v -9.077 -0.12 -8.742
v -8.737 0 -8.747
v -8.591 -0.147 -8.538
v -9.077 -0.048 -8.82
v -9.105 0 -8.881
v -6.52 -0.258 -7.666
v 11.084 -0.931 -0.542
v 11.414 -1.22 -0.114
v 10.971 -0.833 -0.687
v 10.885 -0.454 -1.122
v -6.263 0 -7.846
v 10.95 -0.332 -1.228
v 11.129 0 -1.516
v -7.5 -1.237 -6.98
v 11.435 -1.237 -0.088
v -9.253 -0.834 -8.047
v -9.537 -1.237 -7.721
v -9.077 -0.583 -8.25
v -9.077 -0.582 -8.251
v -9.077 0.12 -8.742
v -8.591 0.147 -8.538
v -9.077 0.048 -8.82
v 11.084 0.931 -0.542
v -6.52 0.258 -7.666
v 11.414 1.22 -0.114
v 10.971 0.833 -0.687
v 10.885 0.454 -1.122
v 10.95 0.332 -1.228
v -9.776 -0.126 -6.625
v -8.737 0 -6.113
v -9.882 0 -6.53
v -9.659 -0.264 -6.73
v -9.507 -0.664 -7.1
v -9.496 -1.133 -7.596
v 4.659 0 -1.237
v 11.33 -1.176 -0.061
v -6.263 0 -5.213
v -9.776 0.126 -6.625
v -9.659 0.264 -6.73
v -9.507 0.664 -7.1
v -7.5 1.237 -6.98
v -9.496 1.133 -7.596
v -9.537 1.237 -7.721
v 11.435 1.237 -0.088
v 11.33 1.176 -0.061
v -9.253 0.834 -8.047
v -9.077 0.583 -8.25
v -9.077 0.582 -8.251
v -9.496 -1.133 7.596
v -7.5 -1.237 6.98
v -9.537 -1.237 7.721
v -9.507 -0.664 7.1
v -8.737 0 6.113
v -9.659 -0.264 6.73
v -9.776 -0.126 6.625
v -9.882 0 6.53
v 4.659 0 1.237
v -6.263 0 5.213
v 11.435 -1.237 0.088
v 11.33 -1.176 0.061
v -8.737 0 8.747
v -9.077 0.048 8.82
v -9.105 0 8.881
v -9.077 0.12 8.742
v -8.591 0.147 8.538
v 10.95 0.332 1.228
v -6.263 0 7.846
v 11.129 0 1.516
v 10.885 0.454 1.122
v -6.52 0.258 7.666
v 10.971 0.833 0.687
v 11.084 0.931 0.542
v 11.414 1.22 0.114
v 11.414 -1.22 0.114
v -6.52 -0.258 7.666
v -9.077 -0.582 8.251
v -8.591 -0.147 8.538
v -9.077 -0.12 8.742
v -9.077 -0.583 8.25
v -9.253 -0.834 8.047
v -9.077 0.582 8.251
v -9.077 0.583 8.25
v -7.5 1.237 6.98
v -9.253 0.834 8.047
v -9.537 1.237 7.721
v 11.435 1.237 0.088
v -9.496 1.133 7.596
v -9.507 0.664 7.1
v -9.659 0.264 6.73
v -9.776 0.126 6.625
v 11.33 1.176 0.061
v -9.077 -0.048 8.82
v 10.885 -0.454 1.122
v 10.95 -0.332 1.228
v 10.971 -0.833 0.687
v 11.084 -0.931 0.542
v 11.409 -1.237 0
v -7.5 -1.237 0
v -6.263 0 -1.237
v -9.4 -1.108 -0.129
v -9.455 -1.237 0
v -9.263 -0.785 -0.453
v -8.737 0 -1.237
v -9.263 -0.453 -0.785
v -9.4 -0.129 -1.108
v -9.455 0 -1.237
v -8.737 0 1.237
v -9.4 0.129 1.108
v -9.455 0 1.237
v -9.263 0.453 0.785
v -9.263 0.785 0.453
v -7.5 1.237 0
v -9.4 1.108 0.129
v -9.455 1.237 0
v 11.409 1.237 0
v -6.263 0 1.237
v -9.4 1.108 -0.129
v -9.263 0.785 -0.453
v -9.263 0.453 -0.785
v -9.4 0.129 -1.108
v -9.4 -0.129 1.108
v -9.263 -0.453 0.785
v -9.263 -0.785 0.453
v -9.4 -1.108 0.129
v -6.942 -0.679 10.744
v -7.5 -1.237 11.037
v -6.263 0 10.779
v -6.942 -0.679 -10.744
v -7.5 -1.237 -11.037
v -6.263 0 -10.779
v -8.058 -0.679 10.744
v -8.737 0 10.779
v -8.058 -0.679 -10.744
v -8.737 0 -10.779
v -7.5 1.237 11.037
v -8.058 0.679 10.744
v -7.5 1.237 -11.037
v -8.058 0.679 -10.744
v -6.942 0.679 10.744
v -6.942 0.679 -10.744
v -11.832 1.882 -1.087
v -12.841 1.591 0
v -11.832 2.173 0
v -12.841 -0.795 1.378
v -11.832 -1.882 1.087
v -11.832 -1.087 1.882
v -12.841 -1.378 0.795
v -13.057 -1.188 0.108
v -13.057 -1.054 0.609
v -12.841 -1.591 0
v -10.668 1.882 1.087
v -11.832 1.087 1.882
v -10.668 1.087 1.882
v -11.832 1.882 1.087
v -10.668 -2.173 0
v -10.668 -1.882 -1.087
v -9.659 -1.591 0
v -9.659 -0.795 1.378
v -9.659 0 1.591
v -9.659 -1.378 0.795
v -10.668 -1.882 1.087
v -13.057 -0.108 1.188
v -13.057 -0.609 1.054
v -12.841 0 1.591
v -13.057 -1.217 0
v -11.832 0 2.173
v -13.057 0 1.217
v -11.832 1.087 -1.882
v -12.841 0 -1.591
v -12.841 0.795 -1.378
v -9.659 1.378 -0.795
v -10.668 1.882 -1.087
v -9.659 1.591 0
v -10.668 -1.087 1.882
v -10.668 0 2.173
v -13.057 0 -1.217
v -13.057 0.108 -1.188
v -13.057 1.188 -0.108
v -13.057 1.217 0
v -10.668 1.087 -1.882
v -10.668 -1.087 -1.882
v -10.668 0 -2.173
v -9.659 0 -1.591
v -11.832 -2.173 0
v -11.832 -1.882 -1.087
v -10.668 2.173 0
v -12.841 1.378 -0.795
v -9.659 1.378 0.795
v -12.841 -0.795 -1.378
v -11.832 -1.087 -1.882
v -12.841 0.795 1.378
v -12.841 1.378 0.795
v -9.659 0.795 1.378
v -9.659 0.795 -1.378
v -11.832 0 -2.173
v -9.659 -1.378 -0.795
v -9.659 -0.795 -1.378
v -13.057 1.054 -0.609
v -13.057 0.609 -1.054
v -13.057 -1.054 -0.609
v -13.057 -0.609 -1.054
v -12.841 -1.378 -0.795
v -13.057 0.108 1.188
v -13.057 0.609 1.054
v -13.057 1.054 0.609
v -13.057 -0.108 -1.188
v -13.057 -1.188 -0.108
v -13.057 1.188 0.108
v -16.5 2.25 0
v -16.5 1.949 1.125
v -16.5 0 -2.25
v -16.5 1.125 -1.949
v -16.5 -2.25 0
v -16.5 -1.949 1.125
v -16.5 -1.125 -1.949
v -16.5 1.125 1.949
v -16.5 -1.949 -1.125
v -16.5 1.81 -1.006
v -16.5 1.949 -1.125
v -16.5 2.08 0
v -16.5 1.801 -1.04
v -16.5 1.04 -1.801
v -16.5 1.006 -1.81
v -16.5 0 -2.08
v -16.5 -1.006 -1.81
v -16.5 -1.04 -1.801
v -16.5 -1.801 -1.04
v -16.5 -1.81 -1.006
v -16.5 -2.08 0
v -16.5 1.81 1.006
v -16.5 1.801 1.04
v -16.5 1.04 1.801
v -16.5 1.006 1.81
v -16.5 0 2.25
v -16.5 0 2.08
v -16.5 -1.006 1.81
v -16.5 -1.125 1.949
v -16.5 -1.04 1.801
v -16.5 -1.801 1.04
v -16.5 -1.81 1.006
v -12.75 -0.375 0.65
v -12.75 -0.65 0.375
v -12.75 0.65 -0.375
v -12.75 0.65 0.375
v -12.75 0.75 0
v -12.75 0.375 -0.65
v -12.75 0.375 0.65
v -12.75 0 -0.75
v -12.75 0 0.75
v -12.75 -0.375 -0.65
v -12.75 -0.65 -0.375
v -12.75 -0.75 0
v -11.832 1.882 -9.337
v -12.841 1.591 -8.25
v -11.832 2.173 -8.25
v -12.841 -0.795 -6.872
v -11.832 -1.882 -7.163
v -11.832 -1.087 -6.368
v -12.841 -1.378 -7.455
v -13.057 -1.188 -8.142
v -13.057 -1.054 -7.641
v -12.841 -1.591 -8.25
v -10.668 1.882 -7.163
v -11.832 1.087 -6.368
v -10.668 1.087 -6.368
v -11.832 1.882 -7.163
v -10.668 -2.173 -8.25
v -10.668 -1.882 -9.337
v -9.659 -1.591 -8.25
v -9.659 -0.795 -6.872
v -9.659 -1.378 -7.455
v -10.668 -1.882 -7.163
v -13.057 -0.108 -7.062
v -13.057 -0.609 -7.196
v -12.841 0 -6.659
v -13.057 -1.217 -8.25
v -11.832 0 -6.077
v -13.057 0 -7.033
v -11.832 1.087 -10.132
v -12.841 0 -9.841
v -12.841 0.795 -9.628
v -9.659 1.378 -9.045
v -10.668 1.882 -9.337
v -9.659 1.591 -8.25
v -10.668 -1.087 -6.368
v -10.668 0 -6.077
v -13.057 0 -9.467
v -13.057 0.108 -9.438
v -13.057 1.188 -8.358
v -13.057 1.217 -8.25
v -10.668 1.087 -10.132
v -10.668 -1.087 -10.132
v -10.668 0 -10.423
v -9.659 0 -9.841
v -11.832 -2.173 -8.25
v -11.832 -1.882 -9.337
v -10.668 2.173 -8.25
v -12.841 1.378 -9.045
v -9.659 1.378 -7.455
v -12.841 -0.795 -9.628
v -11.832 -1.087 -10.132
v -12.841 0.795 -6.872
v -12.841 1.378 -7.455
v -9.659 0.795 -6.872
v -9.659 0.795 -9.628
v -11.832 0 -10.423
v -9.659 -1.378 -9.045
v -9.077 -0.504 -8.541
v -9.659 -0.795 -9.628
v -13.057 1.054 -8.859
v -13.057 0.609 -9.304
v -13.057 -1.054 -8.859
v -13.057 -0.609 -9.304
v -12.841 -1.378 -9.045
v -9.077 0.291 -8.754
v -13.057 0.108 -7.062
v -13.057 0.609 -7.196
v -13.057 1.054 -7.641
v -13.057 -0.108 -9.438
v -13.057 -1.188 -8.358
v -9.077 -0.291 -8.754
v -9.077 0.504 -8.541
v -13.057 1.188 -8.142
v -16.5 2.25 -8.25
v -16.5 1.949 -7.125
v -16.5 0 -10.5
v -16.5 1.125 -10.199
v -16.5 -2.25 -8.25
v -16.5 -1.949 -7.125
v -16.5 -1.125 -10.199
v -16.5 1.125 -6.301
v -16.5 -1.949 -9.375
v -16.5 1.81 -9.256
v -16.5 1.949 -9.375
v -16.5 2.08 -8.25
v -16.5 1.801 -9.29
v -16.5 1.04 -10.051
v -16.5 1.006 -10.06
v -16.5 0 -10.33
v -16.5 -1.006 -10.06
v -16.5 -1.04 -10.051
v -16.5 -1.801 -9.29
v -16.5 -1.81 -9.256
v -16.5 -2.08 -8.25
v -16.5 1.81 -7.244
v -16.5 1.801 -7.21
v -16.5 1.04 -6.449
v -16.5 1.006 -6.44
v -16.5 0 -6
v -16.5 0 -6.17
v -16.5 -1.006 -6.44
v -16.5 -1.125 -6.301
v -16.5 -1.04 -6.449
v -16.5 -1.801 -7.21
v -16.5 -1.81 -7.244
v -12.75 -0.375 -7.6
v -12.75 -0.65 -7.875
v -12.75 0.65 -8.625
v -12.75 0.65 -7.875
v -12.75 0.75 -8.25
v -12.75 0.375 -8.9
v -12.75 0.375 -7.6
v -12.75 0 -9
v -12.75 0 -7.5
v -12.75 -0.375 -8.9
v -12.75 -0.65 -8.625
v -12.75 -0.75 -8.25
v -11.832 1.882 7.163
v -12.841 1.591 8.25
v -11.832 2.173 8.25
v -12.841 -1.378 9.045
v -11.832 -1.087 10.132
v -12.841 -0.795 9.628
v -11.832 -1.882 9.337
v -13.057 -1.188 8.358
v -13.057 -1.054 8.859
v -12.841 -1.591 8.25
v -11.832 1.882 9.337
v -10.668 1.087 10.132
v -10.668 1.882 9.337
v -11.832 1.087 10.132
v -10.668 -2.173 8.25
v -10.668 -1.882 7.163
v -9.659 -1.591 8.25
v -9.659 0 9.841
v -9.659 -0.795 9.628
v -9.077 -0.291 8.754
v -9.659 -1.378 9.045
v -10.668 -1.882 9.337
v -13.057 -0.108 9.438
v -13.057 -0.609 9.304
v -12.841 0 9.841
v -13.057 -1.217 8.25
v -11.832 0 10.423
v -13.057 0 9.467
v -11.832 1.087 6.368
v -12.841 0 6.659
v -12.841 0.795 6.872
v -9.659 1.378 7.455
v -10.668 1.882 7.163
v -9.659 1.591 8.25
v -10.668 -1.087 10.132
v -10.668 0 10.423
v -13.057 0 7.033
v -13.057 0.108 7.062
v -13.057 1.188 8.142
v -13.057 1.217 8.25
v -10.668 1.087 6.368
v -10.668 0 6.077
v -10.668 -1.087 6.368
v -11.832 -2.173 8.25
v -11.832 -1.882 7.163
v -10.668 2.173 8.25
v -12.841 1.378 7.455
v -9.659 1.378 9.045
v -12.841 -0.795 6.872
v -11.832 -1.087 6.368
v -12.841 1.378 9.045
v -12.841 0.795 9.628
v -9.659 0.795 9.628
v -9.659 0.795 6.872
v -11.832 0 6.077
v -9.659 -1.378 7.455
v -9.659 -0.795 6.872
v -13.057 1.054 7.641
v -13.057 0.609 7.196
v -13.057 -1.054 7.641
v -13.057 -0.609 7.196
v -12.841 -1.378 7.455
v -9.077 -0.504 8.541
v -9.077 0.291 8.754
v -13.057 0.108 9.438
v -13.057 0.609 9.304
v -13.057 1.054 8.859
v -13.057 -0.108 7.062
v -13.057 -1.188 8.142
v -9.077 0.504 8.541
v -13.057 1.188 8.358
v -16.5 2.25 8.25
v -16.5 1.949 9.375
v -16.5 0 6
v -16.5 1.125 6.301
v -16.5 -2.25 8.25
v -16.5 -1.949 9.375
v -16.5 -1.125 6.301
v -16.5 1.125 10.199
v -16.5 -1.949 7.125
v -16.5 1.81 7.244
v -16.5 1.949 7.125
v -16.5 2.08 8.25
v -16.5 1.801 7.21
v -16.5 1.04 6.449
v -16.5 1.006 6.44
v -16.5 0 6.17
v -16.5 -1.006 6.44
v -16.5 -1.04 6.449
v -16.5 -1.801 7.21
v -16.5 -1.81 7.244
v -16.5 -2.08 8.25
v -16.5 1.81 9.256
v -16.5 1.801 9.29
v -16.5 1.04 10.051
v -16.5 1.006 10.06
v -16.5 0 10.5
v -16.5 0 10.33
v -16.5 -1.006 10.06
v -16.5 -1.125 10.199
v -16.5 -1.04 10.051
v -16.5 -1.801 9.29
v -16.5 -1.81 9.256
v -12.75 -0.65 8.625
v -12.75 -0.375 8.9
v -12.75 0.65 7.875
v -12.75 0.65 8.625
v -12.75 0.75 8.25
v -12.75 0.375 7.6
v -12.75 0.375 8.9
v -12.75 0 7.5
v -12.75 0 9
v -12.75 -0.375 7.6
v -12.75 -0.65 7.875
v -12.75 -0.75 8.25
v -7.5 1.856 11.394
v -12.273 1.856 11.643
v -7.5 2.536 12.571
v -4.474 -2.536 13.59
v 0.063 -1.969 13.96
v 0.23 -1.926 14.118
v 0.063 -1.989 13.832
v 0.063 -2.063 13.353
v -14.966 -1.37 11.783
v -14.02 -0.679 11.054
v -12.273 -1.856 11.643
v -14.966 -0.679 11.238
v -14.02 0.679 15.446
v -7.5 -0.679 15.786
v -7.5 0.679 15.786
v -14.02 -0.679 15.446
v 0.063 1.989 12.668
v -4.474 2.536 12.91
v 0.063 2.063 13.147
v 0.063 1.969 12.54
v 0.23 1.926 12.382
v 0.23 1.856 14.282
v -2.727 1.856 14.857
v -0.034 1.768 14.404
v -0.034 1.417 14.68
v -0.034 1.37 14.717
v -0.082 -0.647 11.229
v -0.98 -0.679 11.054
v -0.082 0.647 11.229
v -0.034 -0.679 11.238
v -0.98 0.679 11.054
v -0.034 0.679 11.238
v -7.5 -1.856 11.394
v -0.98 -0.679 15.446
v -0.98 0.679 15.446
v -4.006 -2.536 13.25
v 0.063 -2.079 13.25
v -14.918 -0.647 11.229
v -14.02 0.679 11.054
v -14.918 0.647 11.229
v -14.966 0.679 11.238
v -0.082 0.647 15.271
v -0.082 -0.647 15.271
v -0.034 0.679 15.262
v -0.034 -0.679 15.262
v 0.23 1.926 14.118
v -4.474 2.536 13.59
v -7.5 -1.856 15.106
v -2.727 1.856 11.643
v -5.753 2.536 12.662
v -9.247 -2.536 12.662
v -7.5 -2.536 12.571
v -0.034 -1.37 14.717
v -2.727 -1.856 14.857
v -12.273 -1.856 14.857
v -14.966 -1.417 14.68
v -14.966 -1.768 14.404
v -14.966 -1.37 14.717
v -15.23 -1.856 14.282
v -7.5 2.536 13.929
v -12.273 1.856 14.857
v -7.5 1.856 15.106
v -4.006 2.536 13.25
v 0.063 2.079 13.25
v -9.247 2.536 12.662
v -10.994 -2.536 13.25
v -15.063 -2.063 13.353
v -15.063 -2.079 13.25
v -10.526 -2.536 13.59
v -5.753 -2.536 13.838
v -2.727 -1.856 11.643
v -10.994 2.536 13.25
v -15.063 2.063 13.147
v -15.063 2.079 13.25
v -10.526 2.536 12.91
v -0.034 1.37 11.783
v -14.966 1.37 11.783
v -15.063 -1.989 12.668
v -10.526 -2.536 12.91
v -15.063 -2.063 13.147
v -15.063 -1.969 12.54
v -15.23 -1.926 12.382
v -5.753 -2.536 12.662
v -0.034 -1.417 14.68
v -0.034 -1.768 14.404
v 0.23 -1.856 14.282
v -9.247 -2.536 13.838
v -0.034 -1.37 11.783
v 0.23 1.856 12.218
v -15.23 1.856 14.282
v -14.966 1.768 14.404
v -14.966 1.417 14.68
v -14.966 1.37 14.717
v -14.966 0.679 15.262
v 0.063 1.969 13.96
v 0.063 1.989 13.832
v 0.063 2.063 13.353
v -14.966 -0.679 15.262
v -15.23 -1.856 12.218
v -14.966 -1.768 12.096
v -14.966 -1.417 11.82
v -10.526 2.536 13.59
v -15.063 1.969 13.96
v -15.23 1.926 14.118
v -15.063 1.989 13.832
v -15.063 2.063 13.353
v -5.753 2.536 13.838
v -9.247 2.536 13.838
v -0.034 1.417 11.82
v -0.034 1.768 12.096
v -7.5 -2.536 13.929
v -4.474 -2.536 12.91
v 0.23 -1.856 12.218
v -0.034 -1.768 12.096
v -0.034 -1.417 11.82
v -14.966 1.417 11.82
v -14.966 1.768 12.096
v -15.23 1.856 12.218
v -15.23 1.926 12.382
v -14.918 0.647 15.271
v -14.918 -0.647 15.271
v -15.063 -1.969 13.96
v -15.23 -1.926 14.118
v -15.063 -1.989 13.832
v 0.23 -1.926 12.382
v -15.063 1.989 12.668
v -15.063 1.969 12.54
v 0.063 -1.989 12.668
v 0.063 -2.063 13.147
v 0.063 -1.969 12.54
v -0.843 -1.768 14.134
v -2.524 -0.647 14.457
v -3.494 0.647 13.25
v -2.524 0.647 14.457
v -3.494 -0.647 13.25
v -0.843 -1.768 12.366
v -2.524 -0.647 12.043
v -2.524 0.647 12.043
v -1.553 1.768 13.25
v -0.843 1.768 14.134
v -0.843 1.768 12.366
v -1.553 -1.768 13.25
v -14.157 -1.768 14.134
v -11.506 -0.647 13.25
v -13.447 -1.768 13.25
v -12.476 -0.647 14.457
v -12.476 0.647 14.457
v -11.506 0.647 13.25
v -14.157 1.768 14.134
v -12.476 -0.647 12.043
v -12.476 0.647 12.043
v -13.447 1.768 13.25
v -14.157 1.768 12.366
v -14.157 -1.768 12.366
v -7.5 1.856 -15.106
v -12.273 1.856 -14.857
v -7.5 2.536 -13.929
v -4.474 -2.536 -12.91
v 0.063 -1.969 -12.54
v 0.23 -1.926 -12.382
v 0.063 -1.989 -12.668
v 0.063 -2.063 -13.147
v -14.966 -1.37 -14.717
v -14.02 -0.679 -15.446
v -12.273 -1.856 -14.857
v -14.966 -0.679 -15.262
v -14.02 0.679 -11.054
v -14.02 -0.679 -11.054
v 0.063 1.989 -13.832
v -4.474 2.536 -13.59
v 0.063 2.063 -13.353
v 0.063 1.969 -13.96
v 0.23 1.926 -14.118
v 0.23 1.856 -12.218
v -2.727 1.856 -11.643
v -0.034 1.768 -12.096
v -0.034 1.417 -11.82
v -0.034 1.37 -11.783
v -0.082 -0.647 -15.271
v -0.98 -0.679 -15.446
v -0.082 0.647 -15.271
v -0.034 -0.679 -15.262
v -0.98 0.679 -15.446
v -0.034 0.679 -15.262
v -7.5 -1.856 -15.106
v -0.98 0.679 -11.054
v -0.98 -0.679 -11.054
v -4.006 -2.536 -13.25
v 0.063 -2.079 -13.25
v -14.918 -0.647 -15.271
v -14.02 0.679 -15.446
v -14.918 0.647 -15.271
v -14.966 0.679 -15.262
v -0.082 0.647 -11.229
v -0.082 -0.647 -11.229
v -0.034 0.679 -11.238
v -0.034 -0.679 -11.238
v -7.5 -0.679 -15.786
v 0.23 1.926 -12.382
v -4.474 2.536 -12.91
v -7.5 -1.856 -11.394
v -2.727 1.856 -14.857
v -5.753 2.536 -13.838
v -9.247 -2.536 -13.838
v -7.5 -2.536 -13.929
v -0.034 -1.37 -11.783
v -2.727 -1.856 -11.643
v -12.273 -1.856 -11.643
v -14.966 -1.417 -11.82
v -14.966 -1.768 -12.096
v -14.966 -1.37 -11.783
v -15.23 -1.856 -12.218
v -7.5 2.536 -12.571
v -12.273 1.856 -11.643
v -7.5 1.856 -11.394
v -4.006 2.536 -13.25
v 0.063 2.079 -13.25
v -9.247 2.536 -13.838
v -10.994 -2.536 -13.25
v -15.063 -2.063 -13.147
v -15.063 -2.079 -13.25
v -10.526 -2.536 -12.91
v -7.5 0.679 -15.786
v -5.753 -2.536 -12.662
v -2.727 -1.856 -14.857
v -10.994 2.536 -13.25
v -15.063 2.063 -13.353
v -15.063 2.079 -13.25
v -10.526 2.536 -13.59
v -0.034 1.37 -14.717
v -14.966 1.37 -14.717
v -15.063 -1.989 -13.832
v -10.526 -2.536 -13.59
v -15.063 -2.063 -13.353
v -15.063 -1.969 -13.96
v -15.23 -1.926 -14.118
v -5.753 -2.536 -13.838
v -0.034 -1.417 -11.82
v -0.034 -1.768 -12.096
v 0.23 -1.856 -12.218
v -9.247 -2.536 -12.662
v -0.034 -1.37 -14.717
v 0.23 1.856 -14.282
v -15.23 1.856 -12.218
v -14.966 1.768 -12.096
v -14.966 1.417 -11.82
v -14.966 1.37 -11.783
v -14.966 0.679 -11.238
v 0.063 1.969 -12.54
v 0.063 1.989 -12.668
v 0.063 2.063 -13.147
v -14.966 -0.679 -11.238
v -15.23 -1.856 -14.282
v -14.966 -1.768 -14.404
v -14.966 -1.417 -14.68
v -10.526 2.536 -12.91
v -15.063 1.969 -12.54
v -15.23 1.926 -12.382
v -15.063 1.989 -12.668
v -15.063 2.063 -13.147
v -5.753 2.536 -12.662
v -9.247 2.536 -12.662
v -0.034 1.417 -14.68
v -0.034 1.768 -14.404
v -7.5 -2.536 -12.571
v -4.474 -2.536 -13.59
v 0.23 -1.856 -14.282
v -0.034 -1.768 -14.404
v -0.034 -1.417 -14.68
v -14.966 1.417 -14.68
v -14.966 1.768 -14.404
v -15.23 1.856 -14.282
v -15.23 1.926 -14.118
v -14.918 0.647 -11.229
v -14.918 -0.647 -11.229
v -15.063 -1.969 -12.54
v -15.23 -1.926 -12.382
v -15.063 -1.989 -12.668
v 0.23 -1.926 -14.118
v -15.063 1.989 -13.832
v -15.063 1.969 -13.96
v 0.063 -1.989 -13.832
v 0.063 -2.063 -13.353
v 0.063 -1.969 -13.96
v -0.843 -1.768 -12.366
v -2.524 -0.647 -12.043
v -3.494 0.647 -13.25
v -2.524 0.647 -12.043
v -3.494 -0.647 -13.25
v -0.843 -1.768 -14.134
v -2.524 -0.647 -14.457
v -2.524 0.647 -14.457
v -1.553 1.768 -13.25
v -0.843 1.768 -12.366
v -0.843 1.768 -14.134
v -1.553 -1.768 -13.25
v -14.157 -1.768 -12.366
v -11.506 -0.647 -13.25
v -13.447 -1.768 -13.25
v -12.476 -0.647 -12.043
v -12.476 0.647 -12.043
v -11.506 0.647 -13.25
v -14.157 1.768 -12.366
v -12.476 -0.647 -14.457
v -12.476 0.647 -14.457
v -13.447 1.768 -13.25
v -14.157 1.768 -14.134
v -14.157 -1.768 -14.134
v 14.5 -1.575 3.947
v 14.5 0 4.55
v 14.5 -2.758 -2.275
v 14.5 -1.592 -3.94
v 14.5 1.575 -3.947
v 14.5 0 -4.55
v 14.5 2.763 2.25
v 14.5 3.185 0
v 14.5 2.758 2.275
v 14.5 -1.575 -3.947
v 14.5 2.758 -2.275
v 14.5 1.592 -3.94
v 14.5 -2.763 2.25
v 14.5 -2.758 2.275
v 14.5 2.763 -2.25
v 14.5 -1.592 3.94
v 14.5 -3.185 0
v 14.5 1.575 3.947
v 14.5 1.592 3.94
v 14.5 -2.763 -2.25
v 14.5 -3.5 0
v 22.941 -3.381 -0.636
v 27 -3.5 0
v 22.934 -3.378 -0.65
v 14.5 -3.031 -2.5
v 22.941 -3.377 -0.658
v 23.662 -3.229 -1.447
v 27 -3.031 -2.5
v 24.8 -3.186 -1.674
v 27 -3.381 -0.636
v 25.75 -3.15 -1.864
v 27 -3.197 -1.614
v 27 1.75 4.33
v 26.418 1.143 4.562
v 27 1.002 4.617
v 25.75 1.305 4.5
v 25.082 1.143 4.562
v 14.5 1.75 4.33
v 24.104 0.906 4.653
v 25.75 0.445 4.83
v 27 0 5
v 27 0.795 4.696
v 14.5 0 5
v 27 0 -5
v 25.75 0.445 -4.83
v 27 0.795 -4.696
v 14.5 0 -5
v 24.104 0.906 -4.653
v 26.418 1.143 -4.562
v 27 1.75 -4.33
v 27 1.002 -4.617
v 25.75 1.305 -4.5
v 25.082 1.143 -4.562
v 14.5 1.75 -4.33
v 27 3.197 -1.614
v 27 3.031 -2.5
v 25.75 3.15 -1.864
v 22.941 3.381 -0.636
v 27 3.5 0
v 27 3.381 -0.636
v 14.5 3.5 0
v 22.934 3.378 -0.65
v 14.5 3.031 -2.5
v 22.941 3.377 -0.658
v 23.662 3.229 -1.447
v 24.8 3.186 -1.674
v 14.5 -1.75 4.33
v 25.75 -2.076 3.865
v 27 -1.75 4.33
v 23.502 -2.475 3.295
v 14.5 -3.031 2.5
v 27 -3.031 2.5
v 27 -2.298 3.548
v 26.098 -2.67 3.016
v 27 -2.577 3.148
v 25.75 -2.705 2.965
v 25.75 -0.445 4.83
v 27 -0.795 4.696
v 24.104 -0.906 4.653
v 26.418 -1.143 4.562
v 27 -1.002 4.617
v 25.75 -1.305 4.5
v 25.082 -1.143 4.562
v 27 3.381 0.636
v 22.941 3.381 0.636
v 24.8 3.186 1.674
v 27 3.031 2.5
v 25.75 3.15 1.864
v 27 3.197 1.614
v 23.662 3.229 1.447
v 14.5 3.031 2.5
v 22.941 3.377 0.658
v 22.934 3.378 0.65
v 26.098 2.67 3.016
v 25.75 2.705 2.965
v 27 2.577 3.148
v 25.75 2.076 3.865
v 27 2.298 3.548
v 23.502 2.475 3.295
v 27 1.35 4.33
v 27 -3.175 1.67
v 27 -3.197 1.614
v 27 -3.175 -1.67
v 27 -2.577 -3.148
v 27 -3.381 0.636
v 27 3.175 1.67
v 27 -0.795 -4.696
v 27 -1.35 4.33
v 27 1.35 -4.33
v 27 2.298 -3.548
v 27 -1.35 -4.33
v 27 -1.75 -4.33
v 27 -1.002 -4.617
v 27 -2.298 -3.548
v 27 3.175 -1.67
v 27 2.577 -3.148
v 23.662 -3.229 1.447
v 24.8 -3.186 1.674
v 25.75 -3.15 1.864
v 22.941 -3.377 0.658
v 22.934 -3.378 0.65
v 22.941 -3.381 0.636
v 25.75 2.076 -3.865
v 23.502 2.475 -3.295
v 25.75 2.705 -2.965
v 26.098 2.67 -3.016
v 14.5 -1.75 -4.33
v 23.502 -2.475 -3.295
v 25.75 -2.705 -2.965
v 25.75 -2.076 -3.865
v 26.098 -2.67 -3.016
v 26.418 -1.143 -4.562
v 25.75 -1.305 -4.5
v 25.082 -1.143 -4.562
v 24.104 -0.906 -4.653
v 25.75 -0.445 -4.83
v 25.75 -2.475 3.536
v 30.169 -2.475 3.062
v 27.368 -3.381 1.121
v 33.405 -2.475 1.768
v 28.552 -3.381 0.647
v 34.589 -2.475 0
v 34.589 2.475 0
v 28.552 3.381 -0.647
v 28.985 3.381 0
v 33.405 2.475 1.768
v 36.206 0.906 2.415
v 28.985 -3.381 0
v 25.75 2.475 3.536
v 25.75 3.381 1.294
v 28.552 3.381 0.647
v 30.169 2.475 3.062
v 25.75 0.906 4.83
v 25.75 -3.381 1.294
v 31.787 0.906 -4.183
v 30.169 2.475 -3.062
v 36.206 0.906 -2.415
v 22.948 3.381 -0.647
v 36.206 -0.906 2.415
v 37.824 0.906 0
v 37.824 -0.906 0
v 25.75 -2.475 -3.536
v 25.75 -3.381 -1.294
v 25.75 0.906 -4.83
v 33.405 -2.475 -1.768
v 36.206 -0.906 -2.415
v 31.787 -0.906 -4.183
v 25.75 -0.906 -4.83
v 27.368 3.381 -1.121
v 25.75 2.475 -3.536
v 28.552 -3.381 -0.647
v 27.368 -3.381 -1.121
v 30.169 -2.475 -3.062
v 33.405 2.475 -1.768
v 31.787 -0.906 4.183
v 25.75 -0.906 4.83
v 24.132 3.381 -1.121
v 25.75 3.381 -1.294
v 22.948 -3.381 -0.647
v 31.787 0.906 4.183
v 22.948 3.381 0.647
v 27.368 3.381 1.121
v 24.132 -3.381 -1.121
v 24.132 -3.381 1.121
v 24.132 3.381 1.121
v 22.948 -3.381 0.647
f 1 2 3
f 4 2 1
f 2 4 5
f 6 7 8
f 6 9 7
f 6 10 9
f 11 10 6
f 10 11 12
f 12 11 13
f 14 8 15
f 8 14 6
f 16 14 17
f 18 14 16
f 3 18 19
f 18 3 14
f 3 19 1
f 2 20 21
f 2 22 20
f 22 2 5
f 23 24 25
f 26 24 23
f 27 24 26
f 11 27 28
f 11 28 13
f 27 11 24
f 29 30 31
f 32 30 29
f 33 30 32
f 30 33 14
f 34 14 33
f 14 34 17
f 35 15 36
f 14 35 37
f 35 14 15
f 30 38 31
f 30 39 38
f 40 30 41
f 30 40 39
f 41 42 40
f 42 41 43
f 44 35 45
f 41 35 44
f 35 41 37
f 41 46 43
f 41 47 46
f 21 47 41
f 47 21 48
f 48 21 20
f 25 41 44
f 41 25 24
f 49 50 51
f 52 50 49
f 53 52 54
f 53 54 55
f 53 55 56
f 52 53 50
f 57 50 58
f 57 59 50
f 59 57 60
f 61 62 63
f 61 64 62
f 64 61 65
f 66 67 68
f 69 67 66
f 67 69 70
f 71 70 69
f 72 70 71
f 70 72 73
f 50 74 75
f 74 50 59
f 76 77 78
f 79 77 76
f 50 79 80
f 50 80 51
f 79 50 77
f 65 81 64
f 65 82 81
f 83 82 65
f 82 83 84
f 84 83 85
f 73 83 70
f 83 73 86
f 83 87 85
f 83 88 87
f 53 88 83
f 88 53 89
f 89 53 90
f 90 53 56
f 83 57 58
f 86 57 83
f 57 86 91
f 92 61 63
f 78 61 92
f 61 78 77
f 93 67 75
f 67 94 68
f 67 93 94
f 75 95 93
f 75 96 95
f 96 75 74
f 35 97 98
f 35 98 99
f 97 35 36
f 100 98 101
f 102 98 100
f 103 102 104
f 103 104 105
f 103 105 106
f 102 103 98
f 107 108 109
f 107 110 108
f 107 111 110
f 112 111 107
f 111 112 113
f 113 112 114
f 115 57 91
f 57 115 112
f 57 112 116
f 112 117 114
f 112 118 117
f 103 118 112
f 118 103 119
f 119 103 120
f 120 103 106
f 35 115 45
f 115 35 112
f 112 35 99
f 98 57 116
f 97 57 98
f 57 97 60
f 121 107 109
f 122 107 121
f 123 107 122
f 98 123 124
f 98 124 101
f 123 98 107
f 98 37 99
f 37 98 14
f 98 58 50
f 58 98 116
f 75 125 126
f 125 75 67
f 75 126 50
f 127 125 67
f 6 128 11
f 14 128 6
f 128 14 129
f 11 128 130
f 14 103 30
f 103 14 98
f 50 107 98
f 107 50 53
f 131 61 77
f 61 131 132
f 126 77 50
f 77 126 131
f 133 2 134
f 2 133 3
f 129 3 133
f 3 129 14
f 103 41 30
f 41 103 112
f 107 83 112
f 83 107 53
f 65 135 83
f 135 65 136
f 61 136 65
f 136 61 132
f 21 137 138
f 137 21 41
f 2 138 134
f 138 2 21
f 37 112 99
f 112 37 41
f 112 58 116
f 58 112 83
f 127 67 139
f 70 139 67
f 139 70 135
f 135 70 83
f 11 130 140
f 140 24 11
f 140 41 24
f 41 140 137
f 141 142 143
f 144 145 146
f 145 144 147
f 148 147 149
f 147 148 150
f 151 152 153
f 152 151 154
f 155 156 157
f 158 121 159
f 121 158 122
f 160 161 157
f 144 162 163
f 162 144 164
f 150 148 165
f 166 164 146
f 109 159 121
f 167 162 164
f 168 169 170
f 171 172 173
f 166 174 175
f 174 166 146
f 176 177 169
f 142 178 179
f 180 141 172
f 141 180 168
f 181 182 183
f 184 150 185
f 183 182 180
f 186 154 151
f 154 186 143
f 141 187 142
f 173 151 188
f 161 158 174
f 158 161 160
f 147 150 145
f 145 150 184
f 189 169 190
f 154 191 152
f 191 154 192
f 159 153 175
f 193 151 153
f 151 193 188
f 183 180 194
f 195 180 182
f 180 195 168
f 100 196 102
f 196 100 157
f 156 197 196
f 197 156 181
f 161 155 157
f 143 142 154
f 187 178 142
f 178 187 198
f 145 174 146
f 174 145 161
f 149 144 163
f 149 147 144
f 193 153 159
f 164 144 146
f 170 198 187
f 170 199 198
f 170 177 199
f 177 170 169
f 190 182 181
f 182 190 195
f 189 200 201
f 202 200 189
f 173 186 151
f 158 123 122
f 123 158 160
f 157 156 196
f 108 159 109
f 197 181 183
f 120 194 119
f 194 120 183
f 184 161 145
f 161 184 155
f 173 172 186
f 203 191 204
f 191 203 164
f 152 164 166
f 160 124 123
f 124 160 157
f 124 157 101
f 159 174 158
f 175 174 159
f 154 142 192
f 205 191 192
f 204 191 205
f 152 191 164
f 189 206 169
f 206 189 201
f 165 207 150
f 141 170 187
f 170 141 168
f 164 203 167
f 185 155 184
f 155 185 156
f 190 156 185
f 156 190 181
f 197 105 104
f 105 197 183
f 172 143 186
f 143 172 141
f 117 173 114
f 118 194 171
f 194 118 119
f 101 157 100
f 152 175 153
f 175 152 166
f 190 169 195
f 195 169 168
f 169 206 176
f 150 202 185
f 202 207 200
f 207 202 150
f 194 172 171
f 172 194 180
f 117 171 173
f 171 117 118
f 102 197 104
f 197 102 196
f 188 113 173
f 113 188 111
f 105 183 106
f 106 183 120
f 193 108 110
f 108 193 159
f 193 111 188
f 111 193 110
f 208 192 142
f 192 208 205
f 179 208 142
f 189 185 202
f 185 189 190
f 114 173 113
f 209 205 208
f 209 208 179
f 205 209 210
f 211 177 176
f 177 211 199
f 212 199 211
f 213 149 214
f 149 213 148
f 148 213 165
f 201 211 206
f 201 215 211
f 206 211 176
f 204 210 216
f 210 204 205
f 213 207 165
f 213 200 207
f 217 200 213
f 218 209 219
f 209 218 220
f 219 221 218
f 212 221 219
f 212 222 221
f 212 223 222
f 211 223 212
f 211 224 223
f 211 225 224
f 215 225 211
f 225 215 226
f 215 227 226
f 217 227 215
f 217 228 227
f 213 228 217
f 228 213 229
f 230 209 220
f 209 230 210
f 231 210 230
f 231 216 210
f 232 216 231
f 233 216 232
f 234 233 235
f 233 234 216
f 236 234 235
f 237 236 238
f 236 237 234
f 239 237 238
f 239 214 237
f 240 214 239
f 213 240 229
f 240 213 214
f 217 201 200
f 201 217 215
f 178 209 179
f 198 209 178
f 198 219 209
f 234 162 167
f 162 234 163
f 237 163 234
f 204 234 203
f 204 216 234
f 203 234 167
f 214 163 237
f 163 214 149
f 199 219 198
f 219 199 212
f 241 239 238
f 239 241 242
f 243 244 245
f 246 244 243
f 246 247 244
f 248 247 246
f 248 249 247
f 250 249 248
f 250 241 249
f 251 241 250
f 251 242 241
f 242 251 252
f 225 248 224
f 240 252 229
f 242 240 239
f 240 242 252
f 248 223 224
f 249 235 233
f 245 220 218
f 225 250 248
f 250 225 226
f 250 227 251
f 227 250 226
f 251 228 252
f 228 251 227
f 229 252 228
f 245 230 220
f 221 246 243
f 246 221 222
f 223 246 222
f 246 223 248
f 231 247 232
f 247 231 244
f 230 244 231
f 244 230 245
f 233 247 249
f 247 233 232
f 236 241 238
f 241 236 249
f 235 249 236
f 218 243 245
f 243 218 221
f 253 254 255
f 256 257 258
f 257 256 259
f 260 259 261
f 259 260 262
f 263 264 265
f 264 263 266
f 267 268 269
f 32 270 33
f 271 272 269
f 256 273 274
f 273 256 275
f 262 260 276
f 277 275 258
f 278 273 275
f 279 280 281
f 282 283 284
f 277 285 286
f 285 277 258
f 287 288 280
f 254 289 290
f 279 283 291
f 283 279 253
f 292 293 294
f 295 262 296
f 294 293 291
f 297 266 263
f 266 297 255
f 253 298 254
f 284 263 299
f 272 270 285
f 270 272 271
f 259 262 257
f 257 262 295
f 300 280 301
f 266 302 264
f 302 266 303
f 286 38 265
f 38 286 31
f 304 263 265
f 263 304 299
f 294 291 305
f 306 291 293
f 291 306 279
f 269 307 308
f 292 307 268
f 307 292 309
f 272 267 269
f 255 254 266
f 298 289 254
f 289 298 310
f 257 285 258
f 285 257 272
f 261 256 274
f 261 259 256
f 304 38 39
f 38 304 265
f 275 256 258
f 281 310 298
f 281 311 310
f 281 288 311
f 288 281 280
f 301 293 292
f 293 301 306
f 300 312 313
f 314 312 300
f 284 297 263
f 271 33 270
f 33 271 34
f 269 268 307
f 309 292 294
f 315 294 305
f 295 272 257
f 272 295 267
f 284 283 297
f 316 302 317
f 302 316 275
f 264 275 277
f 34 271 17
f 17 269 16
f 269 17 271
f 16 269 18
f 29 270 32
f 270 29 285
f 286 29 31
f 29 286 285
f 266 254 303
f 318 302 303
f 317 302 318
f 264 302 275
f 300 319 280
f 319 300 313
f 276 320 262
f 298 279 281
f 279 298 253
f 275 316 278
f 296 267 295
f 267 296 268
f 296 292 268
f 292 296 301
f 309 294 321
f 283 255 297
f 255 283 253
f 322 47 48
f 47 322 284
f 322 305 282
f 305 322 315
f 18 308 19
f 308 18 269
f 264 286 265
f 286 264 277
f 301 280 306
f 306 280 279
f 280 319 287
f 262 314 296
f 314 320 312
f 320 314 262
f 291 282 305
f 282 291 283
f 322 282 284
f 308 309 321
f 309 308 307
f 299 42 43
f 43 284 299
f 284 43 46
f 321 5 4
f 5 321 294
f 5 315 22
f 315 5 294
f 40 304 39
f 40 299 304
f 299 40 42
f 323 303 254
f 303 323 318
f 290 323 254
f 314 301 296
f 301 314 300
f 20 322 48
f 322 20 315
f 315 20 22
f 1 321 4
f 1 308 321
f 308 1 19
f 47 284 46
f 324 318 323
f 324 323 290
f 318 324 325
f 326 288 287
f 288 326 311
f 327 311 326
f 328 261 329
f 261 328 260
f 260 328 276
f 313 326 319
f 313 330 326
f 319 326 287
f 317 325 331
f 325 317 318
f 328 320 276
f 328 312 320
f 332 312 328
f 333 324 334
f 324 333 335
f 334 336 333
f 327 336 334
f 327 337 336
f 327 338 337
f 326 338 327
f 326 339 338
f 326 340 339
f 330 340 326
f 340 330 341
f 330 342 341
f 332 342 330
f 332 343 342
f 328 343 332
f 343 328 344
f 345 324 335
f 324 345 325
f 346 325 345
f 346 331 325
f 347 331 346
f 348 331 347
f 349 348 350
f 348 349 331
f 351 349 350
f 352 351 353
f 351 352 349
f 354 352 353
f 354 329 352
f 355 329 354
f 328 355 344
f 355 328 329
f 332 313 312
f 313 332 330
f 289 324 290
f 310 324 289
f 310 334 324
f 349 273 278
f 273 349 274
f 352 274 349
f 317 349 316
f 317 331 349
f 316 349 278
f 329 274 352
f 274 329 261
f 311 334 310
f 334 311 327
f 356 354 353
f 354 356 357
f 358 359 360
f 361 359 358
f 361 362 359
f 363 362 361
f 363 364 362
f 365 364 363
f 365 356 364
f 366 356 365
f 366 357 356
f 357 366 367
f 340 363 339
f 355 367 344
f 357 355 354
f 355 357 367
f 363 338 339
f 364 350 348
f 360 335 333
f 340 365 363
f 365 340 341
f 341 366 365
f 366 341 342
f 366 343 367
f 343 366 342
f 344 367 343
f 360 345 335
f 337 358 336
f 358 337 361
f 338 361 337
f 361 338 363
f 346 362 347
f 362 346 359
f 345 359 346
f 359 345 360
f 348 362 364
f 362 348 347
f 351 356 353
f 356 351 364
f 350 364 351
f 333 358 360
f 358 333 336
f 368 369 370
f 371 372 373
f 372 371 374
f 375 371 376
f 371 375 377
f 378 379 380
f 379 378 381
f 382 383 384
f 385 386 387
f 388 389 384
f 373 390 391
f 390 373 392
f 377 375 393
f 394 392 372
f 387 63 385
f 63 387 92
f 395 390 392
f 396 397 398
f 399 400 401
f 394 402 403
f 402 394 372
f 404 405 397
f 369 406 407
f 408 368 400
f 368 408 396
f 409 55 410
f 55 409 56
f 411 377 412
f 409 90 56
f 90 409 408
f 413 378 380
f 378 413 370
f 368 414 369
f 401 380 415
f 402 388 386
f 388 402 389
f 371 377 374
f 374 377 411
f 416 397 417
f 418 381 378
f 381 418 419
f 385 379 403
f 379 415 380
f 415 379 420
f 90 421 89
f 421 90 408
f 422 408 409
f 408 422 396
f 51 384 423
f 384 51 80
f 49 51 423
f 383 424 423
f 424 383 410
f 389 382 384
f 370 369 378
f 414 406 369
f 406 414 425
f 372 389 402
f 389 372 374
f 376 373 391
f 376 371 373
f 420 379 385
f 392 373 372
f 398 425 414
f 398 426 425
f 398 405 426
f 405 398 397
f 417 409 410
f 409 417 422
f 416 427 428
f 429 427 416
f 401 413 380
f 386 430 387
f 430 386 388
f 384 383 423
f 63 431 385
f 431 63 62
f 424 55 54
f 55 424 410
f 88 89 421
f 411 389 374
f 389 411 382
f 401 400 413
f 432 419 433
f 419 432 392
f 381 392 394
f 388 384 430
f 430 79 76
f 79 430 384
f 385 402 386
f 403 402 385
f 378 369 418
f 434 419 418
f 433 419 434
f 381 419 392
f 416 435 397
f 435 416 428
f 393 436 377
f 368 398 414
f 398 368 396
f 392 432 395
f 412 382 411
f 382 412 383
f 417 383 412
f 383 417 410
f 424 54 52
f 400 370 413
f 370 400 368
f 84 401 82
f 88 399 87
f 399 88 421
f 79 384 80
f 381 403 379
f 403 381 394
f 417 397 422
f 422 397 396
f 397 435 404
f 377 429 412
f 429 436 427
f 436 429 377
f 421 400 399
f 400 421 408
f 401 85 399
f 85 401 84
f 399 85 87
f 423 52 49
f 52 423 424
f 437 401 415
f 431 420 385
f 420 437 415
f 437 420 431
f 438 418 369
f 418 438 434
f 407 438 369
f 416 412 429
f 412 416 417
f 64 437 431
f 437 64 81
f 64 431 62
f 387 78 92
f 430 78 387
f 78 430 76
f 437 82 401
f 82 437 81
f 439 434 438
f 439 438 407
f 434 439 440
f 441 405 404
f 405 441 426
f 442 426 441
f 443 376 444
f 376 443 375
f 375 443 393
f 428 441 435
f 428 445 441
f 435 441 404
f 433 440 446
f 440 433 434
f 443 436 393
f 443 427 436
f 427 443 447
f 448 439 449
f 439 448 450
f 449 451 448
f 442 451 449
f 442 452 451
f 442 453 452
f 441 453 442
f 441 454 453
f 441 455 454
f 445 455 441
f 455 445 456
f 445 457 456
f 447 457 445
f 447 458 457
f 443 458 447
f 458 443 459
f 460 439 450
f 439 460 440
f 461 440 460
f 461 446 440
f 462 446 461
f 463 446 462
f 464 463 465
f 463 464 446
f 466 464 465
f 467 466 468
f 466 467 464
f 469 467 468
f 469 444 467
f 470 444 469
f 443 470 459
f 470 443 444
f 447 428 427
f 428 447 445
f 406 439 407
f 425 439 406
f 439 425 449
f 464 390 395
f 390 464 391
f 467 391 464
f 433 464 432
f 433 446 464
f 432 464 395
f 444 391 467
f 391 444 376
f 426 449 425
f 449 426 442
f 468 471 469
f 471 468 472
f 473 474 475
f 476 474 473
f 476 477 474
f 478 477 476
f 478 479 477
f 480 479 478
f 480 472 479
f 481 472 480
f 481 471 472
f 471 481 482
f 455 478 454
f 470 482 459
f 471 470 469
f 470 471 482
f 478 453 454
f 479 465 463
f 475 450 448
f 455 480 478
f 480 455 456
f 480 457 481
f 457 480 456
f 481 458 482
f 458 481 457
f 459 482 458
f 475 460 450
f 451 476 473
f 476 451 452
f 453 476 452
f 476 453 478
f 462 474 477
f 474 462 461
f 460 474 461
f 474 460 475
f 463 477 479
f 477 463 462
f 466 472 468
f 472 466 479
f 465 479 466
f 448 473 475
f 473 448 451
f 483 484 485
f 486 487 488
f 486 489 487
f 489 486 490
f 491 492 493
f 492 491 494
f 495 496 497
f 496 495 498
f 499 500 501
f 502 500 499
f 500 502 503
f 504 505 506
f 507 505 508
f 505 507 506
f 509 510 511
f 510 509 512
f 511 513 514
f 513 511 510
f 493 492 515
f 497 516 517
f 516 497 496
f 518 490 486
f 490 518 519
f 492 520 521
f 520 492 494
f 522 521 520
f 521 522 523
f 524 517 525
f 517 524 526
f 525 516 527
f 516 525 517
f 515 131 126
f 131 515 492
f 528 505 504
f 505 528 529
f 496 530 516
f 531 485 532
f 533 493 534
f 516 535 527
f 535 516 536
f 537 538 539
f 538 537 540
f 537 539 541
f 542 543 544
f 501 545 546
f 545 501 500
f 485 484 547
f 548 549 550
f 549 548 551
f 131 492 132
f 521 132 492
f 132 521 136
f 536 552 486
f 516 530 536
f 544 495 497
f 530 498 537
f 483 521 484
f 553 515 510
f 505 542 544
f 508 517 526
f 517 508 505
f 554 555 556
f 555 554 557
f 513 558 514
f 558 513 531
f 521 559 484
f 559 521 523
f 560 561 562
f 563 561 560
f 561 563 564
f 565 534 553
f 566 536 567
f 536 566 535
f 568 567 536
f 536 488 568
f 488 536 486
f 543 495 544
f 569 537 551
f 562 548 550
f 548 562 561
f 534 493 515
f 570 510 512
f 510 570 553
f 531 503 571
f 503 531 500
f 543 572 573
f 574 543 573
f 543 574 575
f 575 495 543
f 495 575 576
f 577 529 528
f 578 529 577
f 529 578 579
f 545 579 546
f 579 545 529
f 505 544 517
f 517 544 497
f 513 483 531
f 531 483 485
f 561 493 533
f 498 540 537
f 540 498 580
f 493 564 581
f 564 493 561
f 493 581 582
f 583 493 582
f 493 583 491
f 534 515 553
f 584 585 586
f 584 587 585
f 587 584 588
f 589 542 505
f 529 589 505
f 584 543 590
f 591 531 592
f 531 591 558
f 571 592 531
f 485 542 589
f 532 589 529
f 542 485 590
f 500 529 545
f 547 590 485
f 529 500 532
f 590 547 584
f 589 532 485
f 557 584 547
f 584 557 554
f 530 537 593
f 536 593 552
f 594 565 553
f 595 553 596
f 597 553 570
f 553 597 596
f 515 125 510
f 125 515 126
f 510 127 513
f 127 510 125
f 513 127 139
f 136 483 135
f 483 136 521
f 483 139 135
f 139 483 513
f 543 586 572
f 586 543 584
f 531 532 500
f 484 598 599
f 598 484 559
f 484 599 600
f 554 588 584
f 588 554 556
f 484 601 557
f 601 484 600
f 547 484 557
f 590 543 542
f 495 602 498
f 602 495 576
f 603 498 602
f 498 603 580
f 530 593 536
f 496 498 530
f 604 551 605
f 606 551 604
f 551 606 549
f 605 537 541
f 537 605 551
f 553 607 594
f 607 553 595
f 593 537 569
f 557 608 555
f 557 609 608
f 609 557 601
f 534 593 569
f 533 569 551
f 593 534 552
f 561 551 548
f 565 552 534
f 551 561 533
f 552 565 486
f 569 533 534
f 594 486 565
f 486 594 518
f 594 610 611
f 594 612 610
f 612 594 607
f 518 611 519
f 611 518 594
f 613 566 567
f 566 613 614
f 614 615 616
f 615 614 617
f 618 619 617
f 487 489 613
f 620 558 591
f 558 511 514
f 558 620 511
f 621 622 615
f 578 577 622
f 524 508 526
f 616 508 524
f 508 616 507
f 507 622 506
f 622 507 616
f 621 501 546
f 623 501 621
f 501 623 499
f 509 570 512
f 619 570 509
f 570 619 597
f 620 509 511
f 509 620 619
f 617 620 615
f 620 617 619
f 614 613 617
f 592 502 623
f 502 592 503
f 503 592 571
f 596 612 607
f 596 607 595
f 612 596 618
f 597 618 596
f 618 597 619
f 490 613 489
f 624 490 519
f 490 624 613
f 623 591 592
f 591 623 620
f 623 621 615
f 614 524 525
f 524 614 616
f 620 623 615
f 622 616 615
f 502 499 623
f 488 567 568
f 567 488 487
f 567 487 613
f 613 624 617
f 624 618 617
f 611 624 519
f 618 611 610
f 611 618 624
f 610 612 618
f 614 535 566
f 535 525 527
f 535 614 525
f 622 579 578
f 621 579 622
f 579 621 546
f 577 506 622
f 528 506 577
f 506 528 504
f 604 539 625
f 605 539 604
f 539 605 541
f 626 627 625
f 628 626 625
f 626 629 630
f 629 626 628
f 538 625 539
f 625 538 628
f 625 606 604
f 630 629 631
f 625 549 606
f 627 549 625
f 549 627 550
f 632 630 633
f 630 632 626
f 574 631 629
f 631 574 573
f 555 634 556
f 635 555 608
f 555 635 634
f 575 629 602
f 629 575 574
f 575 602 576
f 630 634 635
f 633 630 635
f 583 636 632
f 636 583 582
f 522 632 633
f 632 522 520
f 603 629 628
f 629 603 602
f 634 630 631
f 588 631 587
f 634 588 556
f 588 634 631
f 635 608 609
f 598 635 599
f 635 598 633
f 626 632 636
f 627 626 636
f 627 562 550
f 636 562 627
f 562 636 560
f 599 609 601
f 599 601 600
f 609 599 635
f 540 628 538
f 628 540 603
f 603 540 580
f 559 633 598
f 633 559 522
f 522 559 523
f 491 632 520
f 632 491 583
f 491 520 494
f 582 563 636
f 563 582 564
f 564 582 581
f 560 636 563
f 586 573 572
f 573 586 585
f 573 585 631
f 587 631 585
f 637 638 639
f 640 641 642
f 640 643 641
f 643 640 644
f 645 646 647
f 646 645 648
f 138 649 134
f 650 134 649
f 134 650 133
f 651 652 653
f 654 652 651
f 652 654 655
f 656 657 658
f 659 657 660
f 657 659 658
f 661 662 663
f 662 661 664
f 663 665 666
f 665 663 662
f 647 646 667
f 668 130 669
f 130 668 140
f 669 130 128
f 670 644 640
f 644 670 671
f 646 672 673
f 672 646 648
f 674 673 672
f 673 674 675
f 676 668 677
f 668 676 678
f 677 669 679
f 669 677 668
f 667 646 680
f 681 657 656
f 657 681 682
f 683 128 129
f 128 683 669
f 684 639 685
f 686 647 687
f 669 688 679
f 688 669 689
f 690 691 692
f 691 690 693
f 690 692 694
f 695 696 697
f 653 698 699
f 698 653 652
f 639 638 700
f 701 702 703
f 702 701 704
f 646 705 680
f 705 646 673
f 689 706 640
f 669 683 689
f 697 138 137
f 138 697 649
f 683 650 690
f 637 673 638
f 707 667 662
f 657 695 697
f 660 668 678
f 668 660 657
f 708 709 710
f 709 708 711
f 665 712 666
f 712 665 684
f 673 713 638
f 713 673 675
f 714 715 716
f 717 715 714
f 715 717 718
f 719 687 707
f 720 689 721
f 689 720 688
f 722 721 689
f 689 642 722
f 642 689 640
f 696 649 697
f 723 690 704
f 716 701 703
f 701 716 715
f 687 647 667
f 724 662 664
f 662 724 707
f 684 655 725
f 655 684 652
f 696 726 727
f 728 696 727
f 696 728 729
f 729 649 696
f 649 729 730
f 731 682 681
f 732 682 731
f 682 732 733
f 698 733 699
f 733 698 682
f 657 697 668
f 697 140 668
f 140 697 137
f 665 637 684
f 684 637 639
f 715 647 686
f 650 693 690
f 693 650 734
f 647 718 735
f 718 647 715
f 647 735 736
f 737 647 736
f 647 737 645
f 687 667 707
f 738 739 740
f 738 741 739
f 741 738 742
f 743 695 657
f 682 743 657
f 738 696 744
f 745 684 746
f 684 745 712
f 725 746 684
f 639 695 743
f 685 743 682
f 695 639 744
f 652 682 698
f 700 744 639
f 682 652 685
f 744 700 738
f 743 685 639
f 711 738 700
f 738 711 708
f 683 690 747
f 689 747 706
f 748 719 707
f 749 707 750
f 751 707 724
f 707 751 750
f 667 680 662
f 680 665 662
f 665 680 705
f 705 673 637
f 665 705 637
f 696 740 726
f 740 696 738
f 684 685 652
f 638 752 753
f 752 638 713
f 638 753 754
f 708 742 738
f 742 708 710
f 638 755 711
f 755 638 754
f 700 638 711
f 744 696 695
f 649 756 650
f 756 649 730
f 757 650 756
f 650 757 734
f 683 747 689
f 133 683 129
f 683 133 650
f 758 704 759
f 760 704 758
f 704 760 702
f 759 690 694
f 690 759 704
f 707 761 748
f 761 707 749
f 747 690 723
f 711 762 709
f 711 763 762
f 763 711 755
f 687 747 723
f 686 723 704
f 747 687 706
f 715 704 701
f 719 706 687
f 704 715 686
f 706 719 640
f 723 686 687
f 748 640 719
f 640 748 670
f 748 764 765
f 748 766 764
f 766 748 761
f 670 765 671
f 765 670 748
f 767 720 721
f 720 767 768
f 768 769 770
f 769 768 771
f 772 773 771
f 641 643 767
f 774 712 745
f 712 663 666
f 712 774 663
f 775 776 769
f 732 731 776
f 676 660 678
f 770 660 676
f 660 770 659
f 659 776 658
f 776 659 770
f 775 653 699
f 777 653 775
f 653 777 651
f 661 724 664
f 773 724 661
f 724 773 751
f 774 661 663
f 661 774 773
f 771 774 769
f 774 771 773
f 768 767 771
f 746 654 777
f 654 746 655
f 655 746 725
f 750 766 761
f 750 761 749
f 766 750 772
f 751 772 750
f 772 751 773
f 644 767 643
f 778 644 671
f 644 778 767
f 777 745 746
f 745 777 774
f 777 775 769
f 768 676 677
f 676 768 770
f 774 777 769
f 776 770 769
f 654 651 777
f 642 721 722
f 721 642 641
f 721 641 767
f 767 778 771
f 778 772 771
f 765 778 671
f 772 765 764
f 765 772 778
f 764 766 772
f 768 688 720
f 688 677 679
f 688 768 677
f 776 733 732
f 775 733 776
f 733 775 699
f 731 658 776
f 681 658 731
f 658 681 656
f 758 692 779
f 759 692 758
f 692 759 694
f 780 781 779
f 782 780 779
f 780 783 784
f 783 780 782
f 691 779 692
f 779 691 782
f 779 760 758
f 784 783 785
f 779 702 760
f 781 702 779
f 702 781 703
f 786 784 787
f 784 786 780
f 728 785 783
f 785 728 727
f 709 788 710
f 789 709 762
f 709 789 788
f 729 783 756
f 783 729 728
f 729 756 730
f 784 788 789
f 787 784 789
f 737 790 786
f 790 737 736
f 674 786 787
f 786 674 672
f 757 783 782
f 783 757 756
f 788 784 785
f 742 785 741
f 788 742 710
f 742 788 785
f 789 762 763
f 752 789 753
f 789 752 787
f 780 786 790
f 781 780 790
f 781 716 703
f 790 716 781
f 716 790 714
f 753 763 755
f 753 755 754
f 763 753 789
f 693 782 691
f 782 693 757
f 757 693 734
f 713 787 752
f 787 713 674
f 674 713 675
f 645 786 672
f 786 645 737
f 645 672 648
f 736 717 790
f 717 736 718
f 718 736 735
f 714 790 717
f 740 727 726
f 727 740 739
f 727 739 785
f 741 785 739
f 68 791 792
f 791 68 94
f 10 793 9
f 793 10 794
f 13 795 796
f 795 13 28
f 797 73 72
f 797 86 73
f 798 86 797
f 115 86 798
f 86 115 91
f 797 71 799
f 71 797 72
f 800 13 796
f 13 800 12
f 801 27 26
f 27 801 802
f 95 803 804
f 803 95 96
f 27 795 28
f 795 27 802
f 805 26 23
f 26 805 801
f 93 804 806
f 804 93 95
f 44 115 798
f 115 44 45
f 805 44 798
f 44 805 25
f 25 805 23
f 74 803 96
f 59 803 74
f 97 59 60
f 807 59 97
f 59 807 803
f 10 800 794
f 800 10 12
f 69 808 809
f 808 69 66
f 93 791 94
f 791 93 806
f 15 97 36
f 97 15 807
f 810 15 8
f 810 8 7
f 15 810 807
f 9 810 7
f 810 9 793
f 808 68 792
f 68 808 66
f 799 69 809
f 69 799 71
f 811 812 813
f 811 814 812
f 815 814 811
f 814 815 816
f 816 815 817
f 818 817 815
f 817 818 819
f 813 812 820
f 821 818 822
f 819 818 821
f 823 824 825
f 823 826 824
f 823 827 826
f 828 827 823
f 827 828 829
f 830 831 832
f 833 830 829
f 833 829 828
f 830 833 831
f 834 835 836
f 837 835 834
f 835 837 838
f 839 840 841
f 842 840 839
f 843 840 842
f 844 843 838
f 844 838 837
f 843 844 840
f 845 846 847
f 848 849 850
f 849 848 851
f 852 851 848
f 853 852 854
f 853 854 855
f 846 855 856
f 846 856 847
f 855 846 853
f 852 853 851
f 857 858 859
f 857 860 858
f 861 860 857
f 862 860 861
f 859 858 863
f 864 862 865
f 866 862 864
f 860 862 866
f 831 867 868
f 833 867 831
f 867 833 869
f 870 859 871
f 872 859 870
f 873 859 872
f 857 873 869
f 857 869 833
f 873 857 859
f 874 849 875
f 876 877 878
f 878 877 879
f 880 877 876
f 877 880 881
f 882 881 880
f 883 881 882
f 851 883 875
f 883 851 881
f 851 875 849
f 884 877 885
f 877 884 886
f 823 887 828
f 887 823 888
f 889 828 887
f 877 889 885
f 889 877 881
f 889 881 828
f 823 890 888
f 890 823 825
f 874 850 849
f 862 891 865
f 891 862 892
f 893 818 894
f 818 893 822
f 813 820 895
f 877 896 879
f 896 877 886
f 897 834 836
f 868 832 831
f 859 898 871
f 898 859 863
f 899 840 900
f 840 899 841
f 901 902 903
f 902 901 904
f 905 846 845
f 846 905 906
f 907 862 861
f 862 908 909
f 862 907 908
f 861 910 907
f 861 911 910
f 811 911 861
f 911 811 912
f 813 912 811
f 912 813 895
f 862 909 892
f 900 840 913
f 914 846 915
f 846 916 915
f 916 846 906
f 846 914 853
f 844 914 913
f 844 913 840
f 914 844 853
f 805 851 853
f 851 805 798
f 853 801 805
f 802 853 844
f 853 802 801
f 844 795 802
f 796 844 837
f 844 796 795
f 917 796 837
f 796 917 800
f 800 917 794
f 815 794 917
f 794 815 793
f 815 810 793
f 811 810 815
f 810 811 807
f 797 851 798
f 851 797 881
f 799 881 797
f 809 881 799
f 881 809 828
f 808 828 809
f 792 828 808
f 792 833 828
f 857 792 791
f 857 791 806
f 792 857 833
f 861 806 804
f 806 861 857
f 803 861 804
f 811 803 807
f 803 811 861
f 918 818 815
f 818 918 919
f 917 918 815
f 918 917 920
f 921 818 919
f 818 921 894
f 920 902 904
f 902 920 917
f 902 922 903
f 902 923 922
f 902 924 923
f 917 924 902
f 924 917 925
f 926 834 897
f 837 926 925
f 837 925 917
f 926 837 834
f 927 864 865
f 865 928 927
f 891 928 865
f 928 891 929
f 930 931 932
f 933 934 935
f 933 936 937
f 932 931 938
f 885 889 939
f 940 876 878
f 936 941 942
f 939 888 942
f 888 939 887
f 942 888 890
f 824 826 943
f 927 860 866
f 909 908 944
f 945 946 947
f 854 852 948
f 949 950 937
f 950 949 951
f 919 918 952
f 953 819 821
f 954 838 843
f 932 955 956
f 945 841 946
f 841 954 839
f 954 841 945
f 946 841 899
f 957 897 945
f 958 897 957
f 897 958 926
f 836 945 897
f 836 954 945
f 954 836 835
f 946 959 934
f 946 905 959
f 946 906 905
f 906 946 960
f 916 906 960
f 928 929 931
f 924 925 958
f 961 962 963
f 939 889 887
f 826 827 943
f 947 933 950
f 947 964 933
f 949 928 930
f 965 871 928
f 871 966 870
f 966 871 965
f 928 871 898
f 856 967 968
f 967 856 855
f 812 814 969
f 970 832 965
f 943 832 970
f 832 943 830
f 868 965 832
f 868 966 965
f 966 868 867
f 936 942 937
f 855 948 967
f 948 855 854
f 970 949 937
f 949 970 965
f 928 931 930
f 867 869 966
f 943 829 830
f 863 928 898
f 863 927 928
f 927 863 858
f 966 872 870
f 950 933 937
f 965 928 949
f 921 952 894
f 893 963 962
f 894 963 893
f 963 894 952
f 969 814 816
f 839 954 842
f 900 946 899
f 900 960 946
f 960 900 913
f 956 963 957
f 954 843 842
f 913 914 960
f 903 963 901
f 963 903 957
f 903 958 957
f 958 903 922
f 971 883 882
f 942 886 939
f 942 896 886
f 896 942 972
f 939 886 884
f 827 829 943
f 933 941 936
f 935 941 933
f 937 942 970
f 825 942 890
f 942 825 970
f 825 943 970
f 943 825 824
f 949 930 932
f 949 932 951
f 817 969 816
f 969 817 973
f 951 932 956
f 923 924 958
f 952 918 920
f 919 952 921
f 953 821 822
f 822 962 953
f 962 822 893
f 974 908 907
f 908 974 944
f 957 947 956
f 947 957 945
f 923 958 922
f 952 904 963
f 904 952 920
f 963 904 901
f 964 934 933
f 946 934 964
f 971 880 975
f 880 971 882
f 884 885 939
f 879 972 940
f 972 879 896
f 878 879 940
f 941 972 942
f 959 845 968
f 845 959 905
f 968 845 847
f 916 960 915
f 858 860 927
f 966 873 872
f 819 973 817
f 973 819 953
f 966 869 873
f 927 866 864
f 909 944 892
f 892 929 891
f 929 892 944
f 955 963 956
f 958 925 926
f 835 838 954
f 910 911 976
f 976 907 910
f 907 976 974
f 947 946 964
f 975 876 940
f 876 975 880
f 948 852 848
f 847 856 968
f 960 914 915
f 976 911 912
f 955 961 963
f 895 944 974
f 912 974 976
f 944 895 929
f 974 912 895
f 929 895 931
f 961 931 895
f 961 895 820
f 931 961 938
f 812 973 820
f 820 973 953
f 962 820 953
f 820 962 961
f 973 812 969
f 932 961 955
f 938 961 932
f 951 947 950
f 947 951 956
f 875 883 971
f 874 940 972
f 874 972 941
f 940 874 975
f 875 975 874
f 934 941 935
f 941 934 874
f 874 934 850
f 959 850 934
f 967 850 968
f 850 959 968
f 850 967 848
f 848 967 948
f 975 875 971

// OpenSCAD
$fn=12;
module frame()
{	
	union() {
		translate(v = [0, -1.7, 0])
			rotate(a = 20, v = [0, 0, 1])
				rotate(a = 45, v = [1, 0, 0])
					cube(size = [10, 0.7, 0.7], center = true);
		translate(v = [0, 1.7, 0])
			rotate(a = -20, v = [0, 0, 1])
				rotate(a = 45, v = [1, 0, 0])
					cube(size = [10, 0.7, 0.7], center = true);
		rotate(a = 45, v = [1, 0, 0])
			cube(size = [10, 0.7, 0.7], center = true);
		translate(v = [-3, 0, 0])
			rotate(a = 90, v = [0, 0, 1])
				rotate(a = 45, v = [1, 0, 0])
					cube(size = [10, 0.7, 0.7], center = true);
	}
}

module engine()
{
	rotate(a = -90, v = [0, 1, 0])
	scale(v = [0.15, 0.15, 0.15])
	difference() {
		union() {
			sphere(r = 6);
			translate(v = [0, 0, 4])
				cylinder(h = 10, r1 = 3, r2 = 6);
		}
		translate(v = [0, 0, 4])
			cylinder(h = 11, r1 = 2, r2 = 5.9);
	}
}

module pod()
{
	difference() {
		scale(v = [1.8, 0.35, 0.35])
			sphere(r = 3);
		translate(v = [4.5, 0, 0])
			scale(v = [3, 1, 1])
				sphere(r = 1);
		translate(v = [-4.5, 0, 0])
			scale(v = [3, 1, 1])
				sphere(r = 1);
	}
}

module scrambler()
{
	frame();
	translate(v = [-4.5, 0, 0])
		engine();
	translate(v = [-4.5, -3.3, 0])
		engine();
	translate(v = [-4.5, 3.3, 0])
		engine();
	translate(v = [-3.0, 5.3, 0])
		pod();
	translate(v = [-3.0, -5.3, 0])
		pod();

	scale(v = [1, 1, 0.7]) {
	translate(v = [5, 0, 0])
	rotate(a = 90, v = [0, 1, 0])
		cylinder(h = 2, r1 = 0.2, r2 = 2, center = true);
	translate(v = [8.3, 0, 0])
	rotate(a = 90, v = [0, 1, 0])
		cylinder(h = 5, r1 = 2, r2 = 2, center = true);
	translate(v = [10.3, 0, 0])
		scale(v = [2.5, 1, 1])
			sphere(r = 2.0);
	}
}

rotate(a = 90, v = [1, 0, 0])
	scale(v = [2.5, 2.5, 2.5])
		scrambler();
